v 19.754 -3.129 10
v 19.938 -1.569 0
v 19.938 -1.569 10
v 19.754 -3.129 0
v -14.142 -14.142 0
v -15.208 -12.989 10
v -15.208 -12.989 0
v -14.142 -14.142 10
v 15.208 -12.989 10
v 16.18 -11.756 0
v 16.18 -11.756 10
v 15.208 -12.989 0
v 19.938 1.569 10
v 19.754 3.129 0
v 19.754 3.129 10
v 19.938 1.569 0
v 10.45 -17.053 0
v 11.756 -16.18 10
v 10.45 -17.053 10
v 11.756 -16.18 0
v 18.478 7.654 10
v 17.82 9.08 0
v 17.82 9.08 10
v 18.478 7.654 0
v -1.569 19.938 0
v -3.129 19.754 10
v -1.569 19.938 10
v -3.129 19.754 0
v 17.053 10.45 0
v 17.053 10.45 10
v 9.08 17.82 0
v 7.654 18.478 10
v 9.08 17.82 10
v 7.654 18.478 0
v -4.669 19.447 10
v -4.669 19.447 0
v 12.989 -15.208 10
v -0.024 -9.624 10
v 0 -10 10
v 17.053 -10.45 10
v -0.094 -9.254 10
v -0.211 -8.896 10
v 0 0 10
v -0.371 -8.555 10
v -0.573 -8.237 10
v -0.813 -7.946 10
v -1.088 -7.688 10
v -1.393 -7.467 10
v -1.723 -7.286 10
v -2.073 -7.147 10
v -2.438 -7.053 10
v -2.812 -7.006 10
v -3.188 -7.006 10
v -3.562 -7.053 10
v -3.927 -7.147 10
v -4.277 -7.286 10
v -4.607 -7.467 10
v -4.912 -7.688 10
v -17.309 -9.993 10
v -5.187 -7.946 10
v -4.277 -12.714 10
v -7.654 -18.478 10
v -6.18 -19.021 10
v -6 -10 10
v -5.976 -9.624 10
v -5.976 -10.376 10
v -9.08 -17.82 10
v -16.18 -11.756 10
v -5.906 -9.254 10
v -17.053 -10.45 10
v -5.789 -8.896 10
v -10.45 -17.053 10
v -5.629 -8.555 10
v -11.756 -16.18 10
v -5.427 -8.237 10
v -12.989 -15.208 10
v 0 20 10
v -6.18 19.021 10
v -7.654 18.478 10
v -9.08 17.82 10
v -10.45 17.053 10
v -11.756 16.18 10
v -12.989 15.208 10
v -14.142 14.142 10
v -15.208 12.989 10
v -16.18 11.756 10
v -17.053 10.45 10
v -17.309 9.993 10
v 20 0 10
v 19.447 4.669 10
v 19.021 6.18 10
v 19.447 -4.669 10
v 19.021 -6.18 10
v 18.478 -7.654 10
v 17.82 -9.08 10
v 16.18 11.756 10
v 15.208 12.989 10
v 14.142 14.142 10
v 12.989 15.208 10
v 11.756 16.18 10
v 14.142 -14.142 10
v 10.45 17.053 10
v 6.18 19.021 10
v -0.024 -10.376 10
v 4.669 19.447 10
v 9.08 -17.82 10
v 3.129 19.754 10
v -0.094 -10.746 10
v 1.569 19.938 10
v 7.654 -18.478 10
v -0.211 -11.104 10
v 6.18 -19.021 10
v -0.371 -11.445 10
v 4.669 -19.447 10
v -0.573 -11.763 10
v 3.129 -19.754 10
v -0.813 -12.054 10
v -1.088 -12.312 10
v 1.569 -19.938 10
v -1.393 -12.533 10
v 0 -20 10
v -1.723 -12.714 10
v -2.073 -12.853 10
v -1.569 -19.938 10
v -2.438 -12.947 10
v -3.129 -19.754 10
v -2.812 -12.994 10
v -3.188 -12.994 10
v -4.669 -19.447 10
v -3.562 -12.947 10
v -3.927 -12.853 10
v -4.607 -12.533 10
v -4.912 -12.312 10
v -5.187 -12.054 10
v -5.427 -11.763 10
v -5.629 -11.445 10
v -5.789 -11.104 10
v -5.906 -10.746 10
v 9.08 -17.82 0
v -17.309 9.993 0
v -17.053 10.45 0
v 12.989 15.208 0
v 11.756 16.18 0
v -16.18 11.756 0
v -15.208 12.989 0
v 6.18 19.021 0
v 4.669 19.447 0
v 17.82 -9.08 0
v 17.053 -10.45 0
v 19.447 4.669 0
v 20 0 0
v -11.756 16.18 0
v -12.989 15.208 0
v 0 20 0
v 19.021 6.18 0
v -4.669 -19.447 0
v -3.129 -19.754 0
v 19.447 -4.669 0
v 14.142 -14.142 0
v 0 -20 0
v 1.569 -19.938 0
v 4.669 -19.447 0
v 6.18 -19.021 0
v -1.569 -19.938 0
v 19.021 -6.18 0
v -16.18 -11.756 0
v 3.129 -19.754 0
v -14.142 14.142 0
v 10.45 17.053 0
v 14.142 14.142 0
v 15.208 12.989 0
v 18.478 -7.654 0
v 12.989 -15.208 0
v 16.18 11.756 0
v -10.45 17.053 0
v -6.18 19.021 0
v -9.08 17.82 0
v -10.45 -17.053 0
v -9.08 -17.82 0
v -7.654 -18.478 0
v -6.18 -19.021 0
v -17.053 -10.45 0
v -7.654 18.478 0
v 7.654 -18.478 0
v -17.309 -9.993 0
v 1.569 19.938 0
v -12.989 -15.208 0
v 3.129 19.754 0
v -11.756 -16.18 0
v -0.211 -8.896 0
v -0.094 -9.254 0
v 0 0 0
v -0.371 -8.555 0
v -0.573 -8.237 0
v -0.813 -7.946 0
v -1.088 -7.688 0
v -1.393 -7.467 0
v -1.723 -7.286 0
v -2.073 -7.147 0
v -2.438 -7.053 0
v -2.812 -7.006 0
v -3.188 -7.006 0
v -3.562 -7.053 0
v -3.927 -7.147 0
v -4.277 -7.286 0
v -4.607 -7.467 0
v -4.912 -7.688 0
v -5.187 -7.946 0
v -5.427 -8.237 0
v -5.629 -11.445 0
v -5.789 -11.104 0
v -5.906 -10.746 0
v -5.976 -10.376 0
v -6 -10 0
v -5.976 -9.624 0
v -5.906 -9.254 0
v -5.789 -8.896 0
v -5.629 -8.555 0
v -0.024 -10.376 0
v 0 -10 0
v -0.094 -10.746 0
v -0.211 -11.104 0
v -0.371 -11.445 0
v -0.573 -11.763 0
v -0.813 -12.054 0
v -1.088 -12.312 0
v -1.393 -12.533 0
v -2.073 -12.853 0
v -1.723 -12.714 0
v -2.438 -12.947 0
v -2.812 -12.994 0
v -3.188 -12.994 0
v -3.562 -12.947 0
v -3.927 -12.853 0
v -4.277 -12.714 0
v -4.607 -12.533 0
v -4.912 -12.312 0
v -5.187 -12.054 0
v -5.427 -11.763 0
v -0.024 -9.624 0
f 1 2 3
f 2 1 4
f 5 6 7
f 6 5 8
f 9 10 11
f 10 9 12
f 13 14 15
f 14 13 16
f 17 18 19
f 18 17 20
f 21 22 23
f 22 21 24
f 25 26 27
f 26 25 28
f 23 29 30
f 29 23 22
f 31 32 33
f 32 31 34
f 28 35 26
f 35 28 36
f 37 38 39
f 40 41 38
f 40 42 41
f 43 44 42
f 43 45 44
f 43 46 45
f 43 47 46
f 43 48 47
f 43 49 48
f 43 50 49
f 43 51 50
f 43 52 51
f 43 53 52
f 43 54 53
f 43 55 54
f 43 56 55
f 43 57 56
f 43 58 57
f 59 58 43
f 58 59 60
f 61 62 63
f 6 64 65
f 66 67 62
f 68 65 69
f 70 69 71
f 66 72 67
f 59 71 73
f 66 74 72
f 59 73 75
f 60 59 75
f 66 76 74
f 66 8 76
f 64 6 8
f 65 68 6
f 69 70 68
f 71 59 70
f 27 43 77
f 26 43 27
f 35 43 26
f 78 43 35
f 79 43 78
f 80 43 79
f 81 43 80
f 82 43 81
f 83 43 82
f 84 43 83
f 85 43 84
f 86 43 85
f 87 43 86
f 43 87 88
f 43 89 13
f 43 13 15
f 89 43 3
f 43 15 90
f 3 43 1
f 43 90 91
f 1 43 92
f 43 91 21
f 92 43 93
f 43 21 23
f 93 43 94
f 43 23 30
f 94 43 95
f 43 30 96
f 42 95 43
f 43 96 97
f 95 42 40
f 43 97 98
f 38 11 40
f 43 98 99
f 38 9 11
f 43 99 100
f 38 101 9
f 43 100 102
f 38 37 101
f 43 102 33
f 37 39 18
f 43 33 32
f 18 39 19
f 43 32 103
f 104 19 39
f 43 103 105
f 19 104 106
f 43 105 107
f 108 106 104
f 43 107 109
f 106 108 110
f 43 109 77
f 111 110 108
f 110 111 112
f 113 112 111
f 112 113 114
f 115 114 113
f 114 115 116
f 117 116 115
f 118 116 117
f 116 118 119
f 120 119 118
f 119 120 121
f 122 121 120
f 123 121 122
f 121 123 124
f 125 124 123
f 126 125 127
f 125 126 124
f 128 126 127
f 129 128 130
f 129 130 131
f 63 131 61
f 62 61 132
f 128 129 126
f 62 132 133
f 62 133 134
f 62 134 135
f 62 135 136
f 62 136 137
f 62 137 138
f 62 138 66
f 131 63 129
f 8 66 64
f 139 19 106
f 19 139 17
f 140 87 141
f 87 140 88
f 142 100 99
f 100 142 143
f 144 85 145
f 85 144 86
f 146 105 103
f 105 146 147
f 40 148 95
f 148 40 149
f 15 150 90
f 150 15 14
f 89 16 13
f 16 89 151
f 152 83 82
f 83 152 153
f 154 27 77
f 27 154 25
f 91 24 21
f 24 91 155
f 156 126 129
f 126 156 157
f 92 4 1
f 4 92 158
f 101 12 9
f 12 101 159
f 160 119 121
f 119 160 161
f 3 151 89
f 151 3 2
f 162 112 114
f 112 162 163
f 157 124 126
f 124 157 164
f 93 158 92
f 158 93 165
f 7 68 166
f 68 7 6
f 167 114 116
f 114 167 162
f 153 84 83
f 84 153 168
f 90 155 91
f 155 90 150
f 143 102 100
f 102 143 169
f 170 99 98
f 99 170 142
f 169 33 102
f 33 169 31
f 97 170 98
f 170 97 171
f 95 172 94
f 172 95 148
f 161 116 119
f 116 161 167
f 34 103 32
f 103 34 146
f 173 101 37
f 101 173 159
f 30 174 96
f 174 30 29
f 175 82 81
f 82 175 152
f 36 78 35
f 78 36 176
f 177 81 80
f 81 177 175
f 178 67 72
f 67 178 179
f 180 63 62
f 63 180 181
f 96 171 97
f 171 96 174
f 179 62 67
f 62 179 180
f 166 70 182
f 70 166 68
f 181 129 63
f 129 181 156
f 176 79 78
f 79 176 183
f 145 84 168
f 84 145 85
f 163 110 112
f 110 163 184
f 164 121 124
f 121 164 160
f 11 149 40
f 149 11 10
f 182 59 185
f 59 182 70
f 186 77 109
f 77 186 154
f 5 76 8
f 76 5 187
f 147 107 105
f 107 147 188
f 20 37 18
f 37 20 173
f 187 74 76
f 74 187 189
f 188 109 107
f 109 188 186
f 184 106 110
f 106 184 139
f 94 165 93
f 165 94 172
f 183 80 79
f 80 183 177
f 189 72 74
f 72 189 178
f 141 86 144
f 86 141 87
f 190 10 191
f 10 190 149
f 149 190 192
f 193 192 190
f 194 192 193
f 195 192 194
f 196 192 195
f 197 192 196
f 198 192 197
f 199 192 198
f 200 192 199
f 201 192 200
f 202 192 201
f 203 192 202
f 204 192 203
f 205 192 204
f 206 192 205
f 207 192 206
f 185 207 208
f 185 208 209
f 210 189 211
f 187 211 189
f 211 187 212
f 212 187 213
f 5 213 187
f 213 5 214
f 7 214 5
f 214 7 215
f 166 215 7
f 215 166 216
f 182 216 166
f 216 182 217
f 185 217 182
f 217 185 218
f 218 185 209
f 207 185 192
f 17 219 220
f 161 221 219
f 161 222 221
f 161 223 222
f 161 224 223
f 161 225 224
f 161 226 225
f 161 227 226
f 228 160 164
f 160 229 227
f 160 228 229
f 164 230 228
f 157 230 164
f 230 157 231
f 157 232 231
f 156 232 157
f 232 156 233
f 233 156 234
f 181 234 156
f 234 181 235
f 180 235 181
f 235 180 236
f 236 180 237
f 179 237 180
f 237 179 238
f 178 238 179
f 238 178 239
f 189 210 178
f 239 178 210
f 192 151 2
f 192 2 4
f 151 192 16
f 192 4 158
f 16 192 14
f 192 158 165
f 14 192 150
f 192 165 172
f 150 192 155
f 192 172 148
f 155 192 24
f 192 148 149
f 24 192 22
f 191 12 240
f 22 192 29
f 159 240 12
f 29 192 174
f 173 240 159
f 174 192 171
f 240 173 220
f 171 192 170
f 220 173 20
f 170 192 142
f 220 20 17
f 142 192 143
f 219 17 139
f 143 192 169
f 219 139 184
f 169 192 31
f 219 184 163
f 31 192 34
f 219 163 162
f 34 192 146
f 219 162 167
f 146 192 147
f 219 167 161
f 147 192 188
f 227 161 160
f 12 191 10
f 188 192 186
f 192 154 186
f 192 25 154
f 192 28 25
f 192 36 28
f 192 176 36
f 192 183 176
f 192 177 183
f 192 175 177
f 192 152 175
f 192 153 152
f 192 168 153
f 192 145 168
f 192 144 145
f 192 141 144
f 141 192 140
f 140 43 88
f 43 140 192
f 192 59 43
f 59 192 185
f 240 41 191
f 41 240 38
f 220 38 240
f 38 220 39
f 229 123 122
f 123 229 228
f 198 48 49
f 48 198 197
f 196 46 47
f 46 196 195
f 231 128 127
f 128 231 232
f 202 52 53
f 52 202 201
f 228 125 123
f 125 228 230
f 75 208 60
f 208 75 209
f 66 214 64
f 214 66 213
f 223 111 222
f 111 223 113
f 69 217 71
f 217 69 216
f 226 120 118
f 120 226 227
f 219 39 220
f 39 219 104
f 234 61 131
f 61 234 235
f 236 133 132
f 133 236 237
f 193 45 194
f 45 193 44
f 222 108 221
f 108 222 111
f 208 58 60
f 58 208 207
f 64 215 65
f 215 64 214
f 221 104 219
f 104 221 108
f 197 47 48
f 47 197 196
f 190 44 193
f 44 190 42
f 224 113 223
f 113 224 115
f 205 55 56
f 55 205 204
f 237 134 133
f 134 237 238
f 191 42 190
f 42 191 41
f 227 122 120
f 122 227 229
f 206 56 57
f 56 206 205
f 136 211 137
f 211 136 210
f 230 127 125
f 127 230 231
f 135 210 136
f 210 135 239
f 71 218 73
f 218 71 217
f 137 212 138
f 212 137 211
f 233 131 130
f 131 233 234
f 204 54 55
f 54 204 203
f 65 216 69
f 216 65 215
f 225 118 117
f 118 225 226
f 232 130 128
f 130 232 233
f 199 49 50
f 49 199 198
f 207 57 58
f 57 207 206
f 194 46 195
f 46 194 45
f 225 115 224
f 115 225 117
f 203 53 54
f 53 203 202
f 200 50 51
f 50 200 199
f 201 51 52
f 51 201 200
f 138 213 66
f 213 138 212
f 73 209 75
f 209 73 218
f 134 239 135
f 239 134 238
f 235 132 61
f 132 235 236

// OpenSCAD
//---------------------------------------------------------------------
// Pacman Figure
// Maxim Loguncov(Максим Логунцов)
// 9/12/13
//---------------------------------------------------------------------
difference(){
	cylinder(h = 10, r=20, $fn=80);
	translate([-15,0,0]){	
		cylinder(h = 15, r = 15, $fn=3, center = false);
	}
	translate([-3,-10,0]){
		cylinder(h = 15, r=3, $fn=50);
	}
}
